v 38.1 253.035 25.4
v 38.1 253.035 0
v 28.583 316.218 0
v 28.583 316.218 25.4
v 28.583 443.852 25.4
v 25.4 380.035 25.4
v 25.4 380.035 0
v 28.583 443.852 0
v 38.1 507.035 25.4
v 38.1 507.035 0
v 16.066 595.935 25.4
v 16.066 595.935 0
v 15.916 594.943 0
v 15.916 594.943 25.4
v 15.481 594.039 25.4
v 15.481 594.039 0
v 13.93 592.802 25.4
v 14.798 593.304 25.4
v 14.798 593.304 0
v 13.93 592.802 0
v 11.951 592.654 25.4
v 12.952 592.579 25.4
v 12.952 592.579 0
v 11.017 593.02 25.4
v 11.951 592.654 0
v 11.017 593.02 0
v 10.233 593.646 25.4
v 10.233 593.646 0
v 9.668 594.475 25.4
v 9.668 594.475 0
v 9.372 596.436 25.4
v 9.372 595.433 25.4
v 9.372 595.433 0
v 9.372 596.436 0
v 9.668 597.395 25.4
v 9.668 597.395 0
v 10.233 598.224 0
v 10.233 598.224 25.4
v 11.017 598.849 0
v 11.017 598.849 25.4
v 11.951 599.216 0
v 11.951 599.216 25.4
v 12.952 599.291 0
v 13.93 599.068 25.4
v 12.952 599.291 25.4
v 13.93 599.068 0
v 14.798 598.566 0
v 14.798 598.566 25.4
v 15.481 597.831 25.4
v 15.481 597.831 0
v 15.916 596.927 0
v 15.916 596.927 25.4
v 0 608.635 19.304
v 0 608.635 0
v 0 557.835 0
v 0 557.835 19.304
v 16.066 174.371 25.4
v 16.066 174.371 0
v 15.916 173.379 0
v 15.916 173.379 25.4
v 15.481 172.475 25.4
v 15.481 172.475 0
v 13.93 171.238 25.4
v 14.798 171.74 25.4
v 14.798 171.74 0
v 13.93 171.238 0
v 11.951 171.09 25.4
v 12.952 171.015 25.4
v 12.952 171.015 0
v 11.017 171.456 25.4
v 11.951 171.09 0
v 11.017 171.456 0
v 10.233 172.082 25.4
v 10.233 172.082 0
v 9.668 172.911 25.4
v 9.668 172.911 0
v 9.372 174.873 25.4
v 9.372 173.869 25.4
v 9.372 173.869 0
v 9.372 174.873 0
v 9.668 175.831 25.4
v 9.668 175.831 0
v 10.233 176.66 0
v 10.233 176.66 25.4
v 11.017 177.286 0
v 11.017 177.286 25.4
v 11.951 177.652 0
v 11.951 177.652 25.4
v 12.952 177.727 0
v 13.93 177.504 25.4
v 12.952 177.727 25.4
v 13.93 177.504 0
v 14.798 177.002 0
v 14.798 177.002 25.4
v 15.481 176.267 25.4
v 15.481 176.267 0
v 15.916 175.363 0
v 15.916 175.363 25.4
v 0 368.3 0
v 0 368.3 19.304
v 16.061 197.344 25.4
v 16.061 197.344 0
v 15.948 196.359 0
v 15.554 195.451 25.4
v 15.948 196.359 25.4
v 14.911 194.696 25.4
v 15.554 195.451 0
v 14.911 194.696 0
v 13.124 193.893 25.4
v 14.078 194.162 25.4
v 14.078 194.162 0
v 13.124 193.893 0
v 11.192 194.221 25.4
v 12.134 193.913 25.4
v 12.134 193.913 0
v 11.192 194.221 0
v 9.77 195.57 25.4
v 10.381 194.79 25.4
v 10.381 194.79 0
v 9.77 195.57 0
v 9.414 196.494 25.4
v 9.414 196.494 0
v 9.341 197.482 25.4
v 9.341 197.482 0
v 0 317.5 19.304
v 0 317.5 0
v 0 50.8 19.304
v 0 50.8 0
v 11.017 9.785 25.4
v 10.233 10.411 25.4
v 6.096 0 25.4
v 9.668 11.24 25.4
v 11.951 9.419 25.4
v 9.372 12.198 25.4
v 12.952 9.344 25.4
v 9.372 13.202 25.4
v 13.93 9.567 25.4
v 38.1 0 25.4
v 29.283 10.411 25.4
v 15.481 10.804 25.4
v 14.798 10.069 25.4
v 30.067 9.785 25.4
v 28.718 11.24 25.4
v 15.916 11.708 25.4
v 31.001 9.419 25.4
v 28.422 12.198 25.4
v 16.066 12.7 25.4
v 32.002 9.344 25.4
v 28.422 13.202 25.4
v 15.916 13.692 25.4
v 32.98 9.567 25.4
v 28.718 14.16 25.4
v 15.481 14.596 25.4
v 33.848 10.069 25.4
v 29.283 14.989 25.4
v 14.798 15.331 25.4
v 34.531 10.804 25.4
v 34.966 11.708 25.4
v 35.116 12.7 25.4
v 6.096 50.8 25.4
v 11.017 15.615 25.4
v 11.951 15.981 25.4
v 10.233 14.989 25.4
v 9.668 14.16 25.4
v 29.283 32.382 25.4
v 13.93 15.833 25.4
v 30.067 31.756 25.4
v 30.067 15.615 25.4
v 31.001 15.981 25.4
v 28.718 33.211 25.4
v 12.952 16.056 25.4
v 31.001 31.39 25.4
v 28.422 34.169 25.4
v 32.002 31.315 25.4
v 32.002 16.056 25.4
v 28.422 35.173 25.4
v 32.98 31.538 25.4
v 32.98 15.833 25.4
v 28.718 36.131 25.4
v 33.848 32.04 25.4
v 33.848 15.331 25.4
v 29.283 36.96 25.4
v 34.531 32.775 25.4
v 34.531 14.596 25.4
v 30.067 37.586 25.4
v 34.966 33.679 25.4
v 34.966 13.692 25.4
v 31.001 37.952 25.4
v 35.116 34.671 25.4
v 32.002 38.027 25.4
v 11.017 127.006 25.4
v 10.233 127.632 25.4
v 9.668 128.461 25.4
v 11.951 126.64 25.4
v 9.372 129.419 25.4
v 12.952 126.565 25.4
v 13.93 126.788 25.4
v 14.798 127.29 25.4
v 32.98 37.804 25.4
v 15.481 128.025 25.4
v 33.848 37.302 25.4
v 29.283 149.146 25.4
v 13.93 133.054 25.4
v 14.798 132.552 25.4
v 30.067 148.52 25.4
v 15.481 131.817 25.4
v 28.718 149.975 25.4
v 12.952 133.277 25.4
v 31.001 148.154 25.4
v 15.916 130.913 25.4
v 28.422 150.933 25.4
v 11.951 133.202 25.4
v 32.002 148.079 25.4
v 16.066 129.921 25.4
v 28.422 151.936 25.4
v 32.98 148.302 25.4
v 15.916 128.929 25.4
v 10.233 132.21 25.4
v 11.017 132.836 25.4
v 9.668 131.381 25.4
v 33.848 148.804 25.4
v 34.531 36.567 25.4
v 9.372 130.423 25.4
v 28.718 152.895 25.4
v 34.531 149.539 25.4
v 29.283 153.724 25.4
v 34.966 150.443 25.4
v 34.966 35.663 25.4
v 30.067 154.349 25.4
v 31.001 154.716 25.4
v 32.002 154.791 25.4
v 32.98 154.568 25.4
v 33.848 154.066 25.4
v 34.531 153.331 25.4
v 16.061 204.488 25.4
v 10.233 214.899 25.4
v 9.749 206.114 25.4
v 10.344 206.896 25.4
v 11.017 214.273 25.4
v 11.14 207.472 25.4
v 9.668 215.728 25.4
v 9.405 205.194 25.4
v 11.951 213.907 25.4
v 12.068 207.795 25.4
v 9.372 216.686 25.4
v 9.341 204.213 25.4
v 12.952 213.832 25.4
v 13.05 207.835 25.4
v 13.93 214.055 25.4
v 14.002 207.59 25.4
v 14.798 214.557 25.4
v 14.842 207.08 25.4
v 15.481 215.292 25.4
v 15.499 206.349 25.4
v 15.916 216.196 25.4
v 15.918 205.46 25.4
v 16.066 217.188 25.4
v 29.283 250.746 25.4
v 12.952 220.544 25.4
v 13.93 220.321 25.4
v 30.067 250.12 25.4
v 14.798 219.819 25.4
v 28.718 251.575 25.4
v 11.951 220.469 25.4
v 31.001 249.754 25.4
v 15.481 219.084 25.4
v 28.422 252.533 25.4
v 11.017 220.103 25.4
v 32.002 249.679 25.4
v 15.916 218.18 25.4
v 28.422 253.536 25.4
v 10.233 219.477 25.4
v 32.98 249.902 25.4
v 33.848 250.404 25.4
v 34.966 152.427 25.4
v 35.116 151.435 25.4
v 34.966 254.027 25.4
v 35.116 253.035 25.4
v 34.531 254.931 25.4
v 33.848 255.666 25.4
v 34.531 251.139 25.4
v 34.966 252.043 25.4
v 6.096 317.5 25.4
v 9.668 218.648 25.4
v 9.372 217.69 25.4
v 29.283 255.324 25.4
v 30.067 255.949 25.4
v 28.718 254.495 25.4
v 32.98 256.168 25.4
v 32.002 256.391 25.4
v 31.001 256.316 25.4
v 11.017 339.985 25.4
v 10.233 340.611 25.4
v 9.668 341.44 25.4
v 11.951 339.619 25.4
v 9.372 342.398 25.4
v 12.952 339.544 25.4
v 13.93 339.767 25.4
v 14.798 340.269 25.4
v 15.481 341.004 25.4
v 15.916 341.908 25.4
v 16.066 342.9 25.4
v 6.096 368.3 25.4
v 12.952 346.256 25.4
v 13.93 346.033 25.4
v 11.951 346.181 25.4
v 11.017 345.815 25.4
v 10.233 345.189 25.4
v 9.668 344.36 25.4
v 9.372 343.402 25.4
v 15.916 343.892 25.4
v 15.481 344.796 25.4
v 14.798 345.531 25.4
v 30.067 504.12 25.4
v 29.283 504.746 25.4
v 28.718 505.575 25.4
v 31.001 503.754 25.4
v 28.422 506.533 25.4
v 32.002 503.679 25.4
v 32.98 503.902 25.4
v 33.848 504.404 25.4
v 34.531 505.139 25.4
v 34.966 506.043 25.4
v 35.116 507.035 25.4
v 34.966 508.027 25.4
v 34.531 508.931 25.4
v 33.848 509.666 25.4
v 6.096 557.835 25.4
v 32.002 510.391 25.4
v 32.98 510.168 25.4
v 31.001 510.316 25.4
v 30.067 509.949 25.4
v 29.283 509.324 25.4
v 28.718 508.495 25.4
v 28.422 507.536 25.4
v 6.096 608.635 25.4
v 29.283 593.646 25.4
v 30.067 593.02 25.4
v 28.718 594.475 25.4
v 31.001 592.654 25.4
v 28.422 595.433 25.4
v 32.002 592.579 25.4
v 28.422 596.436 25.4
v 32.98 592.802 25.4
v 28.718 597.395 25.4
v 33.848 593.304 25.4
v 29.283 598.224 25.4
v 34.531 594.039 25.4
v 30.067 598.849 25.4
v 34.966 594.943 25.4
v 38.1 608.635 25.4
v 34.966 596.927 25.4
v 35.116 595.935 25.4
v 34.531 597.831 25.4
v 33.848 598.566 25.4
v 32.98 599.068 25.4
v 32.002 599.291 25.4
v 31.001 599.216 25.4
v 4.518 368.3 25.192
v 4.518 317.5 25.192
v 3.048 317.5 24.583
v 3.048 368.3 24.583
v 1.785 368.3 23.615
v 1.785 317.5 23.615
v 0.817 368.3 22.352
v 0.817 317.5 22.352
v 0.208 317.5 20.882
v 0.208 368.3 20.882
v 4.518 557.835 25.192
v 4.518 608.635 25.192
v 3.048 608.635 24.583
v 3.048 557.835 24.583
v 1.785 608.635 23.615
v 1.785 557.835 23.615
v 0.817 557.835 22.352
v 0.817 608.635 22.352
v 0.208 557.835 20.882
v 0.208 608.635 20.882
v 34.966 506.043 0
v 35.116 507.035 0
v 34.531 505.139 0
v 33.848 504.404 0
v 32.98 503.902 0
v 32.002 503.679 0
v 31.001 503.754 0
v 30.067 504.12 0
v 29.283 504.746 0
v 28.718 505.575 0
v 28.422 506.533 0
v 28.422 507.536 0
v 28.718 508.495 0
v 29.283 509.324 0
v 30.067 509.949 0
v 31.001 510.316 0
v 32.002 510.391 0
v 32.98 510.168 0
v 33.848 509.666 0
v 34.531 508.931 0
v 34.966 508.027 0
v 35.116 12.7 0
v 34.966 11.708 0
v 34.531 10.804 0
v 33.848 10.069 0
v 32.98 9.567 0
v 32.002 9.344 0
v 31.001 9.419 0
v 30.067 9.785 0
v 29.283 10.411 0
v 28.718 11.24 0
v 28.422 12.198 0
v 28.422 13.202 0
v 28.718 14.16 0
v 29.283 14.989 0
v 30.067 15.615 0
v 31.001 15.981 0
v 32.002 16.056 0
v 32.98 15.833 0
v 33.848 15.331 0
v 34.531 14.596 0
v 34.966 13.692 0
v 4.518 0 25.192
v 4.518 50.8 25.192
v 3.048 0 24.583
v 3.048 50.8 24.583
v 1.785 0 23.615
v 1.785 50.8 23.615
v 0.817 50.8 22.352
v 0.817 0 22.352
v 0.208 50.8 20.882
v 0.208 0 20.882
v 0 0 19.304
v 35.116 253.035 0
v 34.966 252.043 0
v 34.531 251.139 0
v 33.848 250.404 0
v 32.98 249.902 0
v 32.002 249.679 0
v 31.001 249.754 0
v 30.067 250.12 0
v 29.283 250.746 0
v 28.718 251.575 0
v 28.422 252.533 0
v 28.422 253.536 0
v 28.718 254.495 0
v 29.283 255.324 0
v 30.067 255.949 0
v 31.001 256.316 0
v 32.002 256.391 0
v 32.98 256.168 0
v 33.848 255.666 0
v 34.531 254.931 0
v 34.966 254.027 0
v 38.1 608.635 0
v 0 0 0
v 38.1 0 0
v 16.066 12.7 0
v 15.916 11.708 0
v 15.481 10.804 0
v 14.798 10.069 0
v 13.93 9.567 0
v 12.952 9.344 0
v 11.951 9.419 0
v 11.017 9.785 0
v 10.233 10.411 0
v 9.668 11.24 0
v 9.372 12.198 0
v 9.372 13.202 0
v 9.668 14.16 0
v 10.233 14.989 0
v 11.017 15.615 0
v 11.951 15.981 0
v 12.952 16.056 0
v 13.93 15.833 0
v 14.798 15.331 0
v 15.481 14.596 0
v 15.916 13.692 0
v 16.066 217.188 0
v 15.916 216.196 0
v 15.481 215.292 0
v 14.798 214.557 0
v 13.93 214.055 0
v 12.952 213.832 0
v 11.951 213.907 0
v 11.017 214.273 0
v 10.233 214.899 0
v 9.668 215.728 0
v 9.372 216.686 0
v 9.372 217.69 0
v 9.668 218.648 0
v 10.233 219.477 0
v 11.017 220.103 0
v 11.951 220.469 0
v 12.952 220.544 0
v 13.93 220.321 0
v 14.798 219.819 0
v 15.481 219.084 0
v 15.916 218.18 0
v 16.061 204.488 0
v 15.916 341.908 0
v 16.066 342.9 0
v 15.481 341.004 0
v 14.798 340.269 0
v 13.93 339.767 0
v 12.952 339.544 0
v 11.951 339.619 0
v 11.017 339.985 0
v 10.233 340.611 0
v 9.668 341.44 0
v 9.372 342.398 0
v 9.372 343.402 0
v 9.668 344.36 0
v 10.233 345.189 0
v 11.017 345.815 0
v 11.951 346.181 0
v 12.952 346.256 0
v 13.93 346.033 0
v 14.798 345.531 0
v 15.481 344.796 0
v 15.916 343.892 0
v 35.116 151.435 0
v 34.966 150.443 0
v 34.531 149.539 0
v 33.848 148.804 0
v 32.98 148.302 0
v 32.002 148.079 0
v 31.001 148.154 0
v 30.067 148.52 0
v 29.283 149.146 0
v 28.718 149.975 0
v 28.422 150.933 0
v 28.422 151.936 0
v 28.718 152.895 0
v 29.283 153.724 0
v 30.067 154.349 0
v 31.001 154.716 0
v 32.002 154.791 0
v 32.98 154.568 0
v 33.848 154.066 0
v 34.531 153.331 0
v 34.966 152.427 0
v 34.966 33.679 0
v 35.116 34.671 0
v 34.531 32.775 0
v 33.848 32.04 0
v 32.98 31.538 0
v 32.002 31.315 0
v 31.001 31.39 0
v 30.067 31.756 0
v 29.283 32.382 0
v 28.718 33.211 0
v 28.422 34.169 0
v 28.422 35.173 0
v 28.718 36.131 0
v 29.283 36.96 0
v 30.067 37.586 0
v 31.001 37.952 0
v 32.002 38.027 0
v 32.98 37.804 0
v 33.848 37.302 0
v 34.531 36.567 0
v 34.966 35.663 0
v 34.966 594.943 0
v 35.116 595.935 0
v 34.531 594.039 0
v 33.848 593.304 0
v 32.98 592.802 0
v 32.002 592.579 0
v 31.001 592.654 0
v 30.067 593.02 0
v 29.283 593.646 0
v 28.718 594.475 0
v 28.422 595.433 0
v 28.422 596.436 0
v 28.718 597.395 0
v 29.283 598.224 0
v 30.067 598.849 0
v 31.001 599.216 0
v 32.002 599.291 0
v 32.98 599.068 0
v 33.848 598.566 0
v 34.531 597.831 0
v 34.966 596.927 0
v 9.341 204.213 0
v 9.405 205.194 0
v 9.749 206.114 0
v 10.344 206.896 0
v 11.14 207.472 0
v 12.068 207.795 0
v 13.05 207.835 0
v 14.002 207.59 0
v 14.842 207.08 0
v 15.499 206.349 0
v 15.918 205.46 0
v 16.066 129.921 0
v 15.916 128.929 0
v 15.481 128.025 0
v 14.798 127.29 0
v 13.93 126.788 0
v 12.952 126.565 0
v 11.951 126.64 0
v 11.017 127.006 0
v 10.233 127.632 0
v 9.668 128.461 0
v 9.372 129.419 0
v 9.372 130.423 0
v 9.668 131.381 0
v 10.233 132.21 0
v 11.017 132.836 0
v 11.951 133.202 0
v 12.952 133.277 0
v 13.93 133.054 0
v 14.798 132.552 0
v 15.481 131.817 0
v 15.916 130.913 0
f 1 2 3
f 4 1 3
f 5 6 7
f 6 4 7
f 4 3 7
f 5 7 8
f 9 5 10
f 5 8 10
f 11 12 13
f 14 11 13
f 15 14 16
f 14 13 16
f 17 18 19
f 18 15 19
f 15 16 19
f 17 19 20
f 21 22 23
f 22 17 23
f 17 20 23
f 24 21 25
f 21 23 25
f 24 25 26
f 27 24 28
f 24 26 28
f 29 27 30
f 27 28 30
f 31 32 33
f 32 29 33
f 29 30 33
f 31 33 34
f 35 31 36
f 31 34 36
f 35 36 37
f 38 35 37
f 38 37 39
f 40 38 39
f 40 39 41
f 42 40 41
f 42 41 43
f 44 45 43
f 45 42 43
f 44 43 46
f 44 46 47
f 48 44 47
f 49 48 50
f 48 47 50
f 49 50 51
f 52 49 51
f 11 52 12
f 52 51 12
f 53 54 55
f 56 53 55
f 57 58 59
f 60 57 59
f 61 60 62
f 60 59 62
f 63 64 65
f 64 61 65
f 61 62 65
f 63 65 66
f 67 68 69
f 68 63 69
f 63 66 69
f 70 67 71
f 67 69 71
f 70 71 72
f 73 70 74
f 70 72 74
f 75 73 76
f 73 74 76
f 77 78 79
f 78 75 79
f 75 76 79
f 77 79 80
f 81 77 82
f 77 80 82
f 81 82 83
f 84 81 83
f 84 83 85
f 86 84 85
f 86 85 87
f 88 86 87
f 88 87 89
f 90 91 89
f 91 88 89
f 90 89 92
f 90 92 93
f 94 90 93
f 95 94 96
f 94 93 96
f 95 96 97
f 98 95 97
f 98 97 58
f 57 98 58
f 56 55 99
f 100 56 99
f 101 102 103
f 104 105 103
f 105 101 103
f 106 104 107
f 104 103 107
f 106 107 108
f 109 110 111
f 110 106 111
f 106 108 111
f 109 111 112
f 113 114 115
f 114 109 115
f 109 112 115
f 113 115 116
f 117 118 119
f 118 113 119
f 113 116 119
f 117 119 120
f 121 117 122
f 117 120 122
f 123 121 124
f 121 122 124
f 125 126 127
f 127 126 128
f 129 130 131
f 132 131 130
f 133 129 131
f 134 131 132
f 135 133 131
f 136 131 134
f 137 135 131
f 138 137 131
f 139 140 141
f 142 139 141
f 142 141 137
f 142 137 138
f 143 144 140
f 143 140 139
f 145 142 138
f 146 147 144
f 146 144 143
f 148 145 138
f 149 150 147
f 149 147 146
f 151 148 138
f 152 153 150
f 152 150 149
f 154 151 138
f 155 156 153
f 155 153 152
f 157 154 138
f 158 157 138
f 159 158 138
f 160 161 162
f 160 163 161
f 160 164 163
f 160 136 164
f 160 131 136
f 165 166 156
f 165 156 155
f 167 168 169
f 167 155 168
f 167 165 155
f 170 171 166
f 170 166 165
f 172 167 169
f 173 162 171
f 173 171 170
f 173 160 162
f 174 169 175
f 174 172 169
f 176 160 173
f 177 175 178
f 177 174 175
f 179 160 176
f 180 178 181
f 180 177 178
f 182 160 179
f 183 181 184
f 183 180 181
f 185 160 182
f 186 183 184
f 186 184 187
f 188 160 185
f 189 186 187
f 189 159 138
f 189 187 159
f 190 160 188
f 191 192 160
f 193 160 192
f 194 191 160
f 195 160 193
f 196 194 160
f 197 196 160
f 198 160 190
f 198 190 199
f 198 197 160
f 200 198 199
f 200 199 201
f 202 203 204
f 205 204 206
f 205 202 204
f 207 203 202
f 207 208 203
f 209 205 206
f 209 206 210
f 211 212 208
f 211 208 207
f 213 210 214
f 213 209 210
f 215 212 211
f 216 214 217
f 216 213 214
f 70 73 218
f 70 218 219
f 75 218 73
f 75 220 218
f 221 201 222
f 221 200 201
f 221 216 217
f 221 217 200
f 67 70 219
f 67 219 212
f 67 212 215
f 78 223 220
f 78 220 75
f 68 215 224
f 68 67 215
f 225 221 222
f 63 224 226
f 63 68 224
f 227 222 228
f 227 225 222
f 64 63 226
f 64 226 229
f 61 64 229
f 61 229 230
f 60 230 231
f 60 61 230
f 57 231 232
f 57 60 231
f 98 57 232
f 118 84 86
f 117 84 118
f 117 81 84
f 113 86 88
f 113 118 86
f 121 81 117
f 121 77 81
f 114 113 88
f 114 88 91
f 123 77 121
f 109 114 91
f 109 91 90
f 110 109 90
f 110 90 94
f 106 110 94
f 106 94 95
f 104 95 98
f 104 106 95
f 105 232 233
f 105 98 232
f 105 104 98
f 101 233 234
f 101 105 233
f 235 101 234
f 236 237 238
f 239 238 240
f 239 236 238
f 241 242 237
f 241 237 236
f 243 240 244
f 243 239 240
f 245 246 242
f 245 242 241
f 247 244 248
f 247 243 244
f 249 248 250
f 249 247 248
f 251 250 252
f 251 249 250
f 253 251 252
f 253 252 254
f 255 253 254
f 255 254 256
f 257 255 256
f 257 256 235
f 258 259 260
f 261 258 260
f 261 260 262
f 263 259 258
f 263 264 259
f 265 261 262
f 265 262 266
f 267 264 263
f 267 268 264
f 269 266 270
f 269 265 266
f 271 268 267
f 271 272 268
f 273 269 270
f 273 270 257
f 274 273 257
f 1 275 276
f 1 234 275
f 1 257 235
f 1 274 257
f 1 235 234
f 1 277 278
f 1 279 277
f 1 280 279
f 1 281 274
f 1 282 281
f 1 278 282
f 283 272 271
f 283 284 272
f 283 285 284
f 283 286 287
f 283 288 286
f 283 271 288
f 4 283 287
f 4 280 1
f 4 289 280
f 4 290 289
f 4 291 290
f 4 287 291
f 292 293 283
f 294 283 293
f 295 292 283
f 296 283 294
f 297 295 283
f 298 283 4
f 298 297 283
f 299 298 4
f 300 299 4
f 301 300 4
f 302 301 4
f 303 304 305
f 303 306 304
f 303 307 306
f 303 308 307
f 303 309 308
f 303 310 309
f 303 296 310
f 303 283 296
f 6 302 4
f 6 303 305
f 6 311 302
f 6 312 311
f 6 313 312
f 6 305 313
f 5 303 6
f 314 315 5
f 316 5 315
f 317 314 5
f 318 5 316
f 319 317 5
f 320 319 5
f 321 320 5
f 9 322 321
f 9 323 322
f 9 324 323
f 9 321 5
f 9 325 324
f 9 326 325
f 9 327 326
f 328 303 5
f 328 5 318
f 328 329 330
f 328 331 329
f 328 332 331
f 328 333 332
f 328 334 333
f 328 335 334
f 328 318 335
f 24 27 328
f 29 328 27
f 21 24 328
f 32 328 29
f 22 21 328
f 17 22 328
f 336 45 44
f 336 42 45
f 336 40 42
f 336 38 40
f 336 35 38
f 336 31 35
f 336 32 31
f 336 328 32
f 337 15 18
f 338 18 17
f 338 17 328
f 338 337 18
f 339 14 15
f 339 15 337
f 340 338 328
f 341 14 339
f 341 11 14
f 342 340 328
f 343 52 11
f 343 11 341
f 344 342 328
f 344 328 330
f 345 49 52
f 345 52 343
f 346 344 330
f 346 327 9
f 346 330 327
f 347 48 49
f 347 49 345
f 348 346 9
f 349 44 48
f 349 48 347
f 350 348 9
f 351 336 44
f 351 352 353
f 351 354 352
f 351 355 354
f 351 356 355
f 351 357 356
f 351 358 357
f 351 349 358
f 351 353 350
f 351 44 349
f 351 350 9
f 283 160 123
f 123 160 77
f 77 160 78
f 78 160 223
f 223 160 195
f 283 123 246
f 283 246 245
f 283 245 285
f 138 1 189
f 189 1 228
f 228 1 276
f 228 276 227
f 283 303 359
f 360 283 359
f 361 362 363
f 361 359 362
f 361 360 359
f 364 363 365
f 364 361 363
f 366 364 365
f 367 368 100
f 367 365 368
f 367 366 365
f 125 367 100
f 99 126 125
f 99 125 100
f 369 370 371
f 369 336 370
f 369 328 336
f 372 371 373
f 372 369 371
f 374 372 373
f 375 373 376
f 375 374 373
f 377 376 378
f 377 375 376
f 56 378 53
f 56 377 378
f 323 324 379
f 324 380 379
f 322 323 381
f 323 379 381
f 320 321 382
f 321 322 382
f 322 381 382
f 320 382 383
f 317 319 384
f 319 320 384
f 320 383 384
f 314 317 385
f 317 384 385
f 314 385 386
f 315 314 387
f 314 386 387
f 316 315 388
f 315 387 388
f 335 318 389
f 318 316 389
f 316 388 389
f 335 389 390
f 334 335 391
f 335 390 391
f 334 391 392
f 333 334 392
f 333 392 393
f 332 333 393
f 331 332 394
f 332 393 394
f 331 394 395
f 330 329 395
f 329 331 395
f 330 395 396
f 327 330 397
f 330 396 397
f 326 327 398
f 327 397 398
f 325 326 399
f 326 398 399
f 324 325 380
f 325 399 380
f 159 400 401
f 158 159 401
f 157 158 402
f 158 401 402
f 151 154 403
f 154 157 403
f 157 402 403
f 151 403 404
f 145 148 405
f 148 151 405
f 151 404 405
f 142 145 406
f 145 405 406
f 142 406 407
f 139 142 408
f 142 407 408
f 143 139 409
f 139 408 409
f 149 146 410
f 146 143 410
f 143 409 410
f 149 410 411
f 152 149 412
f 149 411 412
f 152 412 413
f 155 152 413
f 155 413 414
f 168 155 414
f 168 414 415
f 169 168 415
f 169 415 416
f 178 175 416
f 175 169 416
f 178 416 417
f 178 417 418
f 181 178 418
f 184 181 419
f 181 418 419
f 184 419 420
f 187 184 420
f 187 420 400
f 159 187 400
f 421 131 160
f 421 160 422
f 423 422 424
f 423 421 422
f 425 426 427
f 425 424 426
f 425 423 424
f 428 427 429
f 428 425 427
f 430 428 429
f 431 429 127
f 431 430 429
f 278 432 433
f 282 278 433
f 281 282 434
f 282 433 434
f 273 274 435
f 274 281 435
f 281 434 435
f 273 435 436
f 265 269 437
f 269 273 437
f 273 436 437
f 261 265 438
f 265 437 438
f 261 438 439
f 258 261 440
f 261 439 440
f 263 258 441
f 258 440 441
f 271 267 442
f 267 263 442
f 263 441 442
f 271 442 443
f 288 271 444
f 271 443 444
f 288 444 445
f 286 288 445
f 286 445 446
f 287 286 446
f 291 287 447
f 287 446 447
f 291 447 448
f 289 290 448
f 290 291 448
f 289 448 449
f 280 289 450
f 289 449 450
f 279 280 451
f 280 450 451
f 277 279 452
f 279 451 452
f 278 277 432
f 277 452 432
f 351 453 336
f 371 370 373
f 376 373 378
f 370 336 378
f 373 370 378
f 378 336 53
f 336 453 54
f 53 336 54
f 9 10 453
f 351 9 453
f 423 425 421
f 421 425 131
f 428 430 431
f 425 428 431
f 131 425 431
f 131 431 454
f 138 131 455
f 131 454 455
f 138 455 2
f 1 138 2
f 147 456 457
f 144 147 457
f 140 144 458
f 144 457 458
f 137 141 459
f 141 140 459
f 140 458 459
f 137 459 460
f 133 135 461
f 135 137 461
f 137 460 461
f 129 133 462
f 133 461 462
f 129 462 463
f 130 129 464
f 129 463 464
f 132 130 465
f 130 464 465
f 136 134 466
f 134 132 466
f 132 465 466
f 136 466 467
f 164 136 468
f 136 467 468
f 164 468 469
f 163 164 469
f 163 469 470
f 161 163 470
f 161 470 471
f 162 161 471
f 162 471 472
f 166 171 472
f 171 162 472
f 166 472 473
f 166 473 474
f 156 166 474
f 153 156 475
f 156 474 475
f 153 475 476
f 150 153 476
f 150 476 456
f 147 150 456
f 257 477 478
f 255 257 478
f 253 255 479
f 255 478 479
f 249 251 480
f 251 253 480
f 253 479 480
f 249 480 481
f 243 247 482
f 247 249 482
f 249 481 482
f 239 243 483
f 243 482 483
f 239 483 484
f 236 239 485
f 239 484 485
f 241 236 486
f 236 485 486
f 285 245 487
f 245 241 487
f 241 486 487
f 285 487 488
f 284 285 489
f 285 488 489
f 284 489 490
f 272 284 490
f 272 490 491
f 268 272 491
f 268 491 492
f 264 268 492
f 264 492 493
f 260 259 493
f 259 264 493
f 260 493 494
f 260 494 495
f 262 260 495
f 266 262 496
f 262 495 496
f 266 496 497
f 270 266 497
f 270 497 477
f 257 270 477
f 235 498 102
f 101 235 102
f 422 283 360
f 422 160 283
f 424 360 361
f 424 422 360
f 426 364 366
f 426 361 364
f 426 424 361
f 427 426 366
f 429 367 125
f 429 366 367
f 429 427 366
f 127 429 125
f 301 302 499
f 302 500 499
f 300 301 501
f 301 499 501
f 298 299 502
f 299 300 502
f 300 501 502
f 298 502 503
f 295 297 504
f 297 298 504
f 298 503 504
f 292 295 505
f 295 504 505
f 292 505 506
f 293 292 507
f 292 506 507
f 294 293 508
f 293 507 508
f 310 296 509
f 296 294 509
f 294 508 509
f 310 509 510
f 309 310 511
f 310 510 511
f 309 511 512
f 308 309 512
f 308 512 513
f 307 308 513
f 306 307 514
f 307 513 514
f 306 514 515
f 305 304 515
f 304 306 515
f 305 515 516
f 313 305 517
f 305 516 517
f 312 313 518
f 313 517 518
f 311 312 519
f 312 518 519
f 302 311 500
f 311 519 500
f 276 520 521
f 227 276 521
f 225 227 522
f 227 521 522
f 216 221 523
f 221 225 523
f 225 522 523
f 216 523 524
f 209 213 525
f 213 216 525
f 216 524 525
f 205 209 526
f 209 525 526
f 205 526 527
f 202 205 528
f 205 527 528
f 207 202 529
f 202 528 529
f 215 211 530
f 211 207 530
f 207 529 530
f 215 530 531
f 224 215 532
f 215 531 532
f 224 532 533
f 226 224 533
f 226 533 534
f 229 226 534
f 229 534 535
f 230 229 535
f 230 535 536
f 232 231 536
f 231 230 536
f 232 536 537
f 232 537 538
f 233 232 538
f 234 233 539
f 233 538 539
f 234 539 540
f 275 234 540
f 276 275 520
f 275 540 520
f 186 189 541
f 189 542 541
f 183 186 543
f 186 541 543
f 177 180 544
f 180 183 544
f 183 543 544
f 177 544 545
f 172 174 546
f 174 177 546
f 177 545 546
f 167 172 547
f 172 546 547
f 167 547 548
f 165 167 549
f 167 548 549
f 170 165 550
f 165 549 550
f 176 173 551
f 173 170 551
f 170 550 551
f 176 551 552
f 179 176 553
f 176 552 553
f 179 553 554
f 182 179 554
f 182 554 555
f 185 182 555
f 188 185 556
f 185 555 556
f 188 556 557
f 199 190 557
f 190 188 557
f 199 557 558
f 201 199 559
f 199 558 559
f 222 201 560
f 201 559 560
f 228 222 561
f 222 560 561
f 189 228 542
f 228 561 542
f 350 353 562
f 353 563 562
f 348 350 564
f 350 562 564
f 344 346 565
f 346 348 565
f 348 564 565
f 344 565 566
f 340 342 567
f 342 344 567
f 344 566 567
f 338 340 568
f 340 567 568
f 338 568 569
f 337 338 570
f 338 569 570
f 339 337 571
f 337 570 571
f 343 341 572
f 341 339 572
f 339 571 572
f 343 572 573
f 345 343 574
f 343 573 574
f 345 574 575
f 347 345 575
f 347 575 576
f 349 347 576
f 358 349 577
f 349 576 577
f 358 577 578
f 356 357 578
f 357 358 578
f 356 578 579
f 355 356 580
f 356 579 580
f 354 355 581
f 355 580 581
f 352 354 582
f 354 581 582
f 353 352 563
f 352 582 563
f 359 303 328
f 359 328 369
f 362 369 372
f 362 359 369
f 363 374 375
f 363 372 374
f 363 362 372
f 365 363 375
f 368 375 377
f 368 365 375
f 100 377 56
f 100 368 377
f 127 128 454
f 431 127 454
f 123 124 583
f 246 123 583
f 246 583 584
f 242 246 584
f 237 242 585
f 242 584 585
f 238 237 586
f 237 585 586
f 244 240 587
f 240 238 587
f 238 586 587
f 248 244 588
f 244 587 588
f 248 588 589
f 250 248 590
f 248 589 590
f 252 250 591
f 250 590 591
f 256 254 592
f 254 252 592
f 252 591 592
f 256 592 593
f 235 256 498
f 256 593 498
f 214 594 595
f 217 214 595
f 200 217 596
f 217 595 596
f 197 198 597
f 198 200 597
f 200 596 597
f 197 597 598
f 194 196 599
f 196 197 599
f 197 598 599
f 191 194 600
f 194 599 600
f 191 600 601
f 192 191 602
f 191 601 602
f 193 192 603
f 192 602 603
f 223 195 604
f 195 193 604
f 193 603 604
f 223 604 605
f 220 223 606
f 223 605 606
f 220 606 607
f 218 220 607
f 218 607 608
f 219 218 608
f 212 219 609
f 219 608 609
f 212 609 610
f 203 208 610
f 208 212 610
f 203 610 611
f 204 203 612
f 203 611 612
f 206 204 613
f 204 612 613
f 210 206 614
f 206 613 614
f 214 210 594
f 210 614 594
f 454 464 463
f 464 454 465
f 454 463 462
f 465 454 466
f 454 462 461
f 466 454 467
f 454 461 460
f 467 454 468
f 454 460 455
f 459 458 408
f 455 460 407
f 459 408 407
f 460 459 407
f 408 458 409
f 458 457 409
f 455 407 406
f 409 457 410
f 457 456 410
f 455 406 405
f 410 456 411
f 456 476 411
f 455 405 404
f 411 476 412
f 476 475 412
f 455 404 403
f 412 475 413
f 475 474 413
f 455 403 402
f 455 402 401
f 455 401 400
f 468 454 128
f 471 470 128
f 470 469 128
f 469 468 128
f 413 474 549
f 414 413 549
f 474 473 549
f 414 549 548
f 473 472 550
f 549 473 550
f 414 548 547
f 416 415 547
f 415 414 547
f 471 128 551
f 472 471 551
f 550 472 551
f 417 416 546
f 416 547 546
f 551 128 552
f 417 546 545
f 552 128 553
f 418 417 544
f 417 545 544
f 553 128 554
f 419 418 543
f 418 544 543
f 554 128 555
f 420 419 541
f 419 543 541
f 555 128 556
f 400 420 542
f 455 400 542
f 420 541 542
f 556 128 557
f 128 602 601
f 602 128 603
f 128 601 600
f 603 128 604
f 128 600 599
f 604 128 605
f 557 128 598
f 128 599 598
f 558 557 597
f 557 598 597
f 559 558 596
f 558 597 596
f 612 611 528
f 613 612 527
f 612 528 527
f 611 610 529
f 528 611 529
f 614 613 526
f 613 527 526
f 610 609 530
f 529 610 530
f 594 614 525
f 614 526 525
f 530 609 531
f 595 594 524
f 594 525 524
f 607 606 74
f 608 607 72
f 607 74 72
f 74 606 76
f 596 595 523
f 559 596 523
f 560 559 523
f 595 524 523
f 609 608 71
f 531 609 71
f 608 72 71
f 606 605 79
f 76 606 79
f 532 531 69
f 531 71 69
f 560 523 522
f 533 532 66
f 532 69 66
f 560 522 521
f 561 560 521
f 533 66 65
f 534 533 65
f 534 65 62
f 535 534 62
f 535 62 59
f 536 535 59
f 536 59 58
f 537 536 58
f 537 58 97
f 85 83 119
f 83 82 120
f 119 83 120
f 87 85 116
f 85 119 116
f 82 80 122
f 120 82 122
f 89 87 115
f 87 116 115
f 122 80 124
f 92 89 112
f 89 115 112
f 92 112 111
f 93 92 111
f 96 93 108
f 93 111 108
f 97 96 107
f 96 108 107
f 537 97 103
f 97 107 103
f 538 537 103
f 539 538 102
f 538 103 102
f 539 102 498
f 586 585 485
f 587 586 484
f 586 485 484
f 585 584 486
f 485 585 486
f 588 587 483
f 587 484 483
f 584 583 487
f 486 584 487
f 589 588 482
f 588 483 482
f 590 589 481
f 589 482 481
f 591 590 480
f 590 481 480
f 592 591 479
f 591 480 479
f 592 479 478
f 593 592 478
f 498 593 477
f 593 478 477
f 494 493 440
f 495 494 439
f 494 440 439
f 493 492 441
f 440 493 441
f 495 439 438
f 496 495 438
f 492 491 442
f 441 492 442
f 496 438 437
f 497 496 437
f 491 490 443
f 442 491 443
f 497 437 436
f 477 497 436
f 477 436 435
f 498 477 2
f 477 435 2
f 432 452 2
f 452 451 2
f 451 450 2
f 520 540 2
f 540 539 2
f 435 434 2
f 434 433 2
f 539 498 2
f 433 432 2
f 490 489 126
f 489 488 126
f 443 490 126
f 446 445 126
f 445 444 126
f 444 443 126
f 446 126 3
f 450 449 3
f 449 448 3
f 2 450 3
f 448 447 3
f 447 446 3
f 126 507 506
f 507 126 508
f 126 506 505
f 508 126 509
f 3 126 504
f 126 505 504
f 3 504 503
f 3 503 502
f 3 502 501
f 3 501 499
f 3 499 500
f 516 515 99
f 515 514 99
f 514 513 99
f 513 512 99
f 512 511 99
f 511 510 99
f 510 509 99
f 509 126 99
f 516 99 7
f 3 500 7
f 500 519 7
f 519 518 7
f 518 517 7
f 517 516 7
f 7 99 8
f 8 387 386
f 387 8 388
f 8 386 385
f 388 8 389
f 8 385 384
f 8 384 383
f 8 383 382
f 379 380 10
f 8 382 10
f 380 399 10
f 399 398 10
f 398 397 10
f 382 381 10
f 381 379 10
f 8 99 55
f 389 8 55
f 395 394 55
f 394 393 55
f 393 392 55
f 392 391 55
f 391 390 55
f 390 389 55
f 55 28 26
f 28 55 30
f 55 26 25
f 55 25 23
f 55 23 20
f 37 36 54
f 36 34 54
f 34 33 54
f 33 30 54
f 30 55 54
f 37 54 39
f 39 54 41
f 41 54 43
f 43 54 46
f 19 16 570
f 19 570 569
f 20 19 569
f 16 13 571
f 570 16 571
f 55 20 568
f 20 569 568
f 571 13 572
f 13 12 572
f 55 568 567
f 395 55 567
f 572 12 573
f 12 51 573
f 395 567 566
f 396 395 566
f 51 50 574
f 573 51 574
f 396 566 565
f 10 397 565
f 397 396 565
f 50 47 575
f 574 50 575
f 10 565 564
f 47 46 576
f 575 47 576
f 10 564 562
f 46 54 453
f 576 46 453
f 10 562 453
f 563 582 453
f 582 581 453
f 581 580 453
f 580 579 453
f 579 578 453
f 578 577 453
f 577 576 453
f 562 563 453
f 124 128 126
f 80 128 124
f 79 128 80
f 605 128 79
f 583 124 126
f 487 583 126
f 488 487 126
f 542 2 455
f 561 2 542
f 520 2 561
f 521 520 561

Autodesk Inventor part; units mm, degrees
ref_plane "YZ Plane" through (0, 0, 0) normal (1, 0, 0) x (0, 1, 0)
ref_plane "XZ Plane" through (0, 0, 0) normal (0, 1, 0) x (-1, 0, 0)
ref_plane "XY Plane" through (0, 0, 0) normal (0, 0, 1) x (1, 0, 0)
sketch "Sketch1" plane through (0, 0, 0) normal (0, 0, 1) x (1, 0, 0)
  line L0 (0, 0) -> (38.1, 0)
  line L1 (38.1, 0) -> (38.1, 253.0348)
  arc A0 (38.1, 507.0348) -> (38.1, 253.0348) centre (666.75, 380.0348) ccw
  line L2 (38.1, 507.0348) -> (38.1, 608.6348)
  line L3 (38.1, 608.6348) -> (0, 608.6348)
  line L4 (0, 608.6348) -> (0, 0)
  circle A1 centre (31.75, 151.4348) radius 3.3655
  circle A2 centre (31.75, 34.671) radius 3.3655
  circle A3 centre (12.7, 12.7) radius 3.3655
  circle A4 centre (12.7, 342.9) radius 3.3655
  circle A5 centre (12.7, 595.9348) radius 3.3655
  circle A6 centre (31.75, 12.7) radius 3.3655
  circle A7 centre (31.75, 253.0348) radius 3.3655
  circle A8 centre (31.75, 507.0348) radius 3.3655
  circle A9 centre (31.75, 595.9348) radius 3.3655
  line L5 (0, 557.8348) -> (0, 608.6348)
  line L6 (0, 50.8) -> (0, 0)
  line L7 (12.7, 342.9) -> (0, 304.3174) construction
  line L8 (0, 317.5) -> (0, 368.3)
  line L9 (0, 129.921) -> (12.7, 129.921) construction
  circle A10 centre (12.7, 129.921) radius 3.3655
  circle A11 centre (12.7, 174.371) radius 3.3655
  line L10 (9.3413, 197.482) -> (9.3413, 204.213)
  line L11 (16.0611, 204.488) -> (16.0611, 197.3435)
  arc A12 (16.0611, 204.488) -> (9.3413, 204.213) centre (12.6956, 204.488) ccw
  arc A13 (9.3413, 197.482) -> (16.0611, 197.3435) centre (12.6974, 197.231) ccw
  circle A14 centre (12.7, 217.188) radius 3.3655
  dimension "d0" = 38.1
  dimension "d2" = 101.6
  dimension "d4" = 457.2
  dimension "d5" = 101.6
  dimension "d6" = 666.75
  dimension "d7" = 641.35
  dimension "d9" = 116.7638
  dimension "d10" = 6.35
  dimension "d11" = 6.35
  dimension "d13" = 12.7
  dimension "d14" = 12.7
  dimension "d16" = 12.7
  dimension "d17" = 342.9
  dimension "d19" = 12.7
  dimension "d20" = 12.7
  dimension "d22" = 6.35
  dimension "d24" = 6.35
  dimension "d25" = 6.731
  dimension "d26" = 6.35
  dimension "hole" = 6.731
  dimension "d28" = 6.35
  dimension "d45" = 12.7
  dimension "d47" = 12.7
  dimension "d54" = 6.731
  dimension "d55" = 3.3655
  dimension "d56" = 3.3655
  dimension "d58" = 6.731
  dimension "d59" = 12.7
  dimension "d68" = 18.22
  dimension "d69" = 90
  dimension "d70" = 90
  dimension "d71" = 22.0389
  dimension "d72" = 28.7587
  dimension "d73" = 478.7138
  dimension "d74" = 6.35
  dimension "d75" = 6.35
  dimension "d76" = 595.9348
  dimension "d77" = 404.1468
  dimension "d78" = 411.2913
  dimension "d79" = 25.4
  dimension "d80" = 25.4
  dimension "d81" = 434.2638
  dimension "d82" = 50.8
  dimension "d83" = 240.3348
  dimension "d84" = 291.1348
  dimension "d85" = 557.8348
extrude "Extrusion2" add sketch "Sketch1" along normal blind 25.4
fillet "Fillet1" radius 6.096 2 edges at (0, 184.15, 25.4) (0, 488.4674, 25.4)
equation "\"d25\" = hole"
equation "\"BendRadius\" = Thickness"
equation "\"BendReliefWidth\" = Thickness"
equation "\"BendReliefDepth\" = 0.5 * Thickness"
equation "\"CornerReliefSize\" = 4 * Thickness"
equation "\"MinimumRemnant\" = 2 * Thickness"
equation "\"TransitionRadius\" = BendRadius"
equation "\"JacobiRadiusSize\" = BendRadius"
equation "\"GapSize\" = Thickness"
equation "\"d29\" = BendRadius"
equation "\"d32\" = BendRadius"
equation "\"d38\" = BendRadius"
equation "\"d60\" = BendRadius"
equation "\"Thickness\" = 3.048"
properties part number "Claw - Arm - Top (R) Bottom"
